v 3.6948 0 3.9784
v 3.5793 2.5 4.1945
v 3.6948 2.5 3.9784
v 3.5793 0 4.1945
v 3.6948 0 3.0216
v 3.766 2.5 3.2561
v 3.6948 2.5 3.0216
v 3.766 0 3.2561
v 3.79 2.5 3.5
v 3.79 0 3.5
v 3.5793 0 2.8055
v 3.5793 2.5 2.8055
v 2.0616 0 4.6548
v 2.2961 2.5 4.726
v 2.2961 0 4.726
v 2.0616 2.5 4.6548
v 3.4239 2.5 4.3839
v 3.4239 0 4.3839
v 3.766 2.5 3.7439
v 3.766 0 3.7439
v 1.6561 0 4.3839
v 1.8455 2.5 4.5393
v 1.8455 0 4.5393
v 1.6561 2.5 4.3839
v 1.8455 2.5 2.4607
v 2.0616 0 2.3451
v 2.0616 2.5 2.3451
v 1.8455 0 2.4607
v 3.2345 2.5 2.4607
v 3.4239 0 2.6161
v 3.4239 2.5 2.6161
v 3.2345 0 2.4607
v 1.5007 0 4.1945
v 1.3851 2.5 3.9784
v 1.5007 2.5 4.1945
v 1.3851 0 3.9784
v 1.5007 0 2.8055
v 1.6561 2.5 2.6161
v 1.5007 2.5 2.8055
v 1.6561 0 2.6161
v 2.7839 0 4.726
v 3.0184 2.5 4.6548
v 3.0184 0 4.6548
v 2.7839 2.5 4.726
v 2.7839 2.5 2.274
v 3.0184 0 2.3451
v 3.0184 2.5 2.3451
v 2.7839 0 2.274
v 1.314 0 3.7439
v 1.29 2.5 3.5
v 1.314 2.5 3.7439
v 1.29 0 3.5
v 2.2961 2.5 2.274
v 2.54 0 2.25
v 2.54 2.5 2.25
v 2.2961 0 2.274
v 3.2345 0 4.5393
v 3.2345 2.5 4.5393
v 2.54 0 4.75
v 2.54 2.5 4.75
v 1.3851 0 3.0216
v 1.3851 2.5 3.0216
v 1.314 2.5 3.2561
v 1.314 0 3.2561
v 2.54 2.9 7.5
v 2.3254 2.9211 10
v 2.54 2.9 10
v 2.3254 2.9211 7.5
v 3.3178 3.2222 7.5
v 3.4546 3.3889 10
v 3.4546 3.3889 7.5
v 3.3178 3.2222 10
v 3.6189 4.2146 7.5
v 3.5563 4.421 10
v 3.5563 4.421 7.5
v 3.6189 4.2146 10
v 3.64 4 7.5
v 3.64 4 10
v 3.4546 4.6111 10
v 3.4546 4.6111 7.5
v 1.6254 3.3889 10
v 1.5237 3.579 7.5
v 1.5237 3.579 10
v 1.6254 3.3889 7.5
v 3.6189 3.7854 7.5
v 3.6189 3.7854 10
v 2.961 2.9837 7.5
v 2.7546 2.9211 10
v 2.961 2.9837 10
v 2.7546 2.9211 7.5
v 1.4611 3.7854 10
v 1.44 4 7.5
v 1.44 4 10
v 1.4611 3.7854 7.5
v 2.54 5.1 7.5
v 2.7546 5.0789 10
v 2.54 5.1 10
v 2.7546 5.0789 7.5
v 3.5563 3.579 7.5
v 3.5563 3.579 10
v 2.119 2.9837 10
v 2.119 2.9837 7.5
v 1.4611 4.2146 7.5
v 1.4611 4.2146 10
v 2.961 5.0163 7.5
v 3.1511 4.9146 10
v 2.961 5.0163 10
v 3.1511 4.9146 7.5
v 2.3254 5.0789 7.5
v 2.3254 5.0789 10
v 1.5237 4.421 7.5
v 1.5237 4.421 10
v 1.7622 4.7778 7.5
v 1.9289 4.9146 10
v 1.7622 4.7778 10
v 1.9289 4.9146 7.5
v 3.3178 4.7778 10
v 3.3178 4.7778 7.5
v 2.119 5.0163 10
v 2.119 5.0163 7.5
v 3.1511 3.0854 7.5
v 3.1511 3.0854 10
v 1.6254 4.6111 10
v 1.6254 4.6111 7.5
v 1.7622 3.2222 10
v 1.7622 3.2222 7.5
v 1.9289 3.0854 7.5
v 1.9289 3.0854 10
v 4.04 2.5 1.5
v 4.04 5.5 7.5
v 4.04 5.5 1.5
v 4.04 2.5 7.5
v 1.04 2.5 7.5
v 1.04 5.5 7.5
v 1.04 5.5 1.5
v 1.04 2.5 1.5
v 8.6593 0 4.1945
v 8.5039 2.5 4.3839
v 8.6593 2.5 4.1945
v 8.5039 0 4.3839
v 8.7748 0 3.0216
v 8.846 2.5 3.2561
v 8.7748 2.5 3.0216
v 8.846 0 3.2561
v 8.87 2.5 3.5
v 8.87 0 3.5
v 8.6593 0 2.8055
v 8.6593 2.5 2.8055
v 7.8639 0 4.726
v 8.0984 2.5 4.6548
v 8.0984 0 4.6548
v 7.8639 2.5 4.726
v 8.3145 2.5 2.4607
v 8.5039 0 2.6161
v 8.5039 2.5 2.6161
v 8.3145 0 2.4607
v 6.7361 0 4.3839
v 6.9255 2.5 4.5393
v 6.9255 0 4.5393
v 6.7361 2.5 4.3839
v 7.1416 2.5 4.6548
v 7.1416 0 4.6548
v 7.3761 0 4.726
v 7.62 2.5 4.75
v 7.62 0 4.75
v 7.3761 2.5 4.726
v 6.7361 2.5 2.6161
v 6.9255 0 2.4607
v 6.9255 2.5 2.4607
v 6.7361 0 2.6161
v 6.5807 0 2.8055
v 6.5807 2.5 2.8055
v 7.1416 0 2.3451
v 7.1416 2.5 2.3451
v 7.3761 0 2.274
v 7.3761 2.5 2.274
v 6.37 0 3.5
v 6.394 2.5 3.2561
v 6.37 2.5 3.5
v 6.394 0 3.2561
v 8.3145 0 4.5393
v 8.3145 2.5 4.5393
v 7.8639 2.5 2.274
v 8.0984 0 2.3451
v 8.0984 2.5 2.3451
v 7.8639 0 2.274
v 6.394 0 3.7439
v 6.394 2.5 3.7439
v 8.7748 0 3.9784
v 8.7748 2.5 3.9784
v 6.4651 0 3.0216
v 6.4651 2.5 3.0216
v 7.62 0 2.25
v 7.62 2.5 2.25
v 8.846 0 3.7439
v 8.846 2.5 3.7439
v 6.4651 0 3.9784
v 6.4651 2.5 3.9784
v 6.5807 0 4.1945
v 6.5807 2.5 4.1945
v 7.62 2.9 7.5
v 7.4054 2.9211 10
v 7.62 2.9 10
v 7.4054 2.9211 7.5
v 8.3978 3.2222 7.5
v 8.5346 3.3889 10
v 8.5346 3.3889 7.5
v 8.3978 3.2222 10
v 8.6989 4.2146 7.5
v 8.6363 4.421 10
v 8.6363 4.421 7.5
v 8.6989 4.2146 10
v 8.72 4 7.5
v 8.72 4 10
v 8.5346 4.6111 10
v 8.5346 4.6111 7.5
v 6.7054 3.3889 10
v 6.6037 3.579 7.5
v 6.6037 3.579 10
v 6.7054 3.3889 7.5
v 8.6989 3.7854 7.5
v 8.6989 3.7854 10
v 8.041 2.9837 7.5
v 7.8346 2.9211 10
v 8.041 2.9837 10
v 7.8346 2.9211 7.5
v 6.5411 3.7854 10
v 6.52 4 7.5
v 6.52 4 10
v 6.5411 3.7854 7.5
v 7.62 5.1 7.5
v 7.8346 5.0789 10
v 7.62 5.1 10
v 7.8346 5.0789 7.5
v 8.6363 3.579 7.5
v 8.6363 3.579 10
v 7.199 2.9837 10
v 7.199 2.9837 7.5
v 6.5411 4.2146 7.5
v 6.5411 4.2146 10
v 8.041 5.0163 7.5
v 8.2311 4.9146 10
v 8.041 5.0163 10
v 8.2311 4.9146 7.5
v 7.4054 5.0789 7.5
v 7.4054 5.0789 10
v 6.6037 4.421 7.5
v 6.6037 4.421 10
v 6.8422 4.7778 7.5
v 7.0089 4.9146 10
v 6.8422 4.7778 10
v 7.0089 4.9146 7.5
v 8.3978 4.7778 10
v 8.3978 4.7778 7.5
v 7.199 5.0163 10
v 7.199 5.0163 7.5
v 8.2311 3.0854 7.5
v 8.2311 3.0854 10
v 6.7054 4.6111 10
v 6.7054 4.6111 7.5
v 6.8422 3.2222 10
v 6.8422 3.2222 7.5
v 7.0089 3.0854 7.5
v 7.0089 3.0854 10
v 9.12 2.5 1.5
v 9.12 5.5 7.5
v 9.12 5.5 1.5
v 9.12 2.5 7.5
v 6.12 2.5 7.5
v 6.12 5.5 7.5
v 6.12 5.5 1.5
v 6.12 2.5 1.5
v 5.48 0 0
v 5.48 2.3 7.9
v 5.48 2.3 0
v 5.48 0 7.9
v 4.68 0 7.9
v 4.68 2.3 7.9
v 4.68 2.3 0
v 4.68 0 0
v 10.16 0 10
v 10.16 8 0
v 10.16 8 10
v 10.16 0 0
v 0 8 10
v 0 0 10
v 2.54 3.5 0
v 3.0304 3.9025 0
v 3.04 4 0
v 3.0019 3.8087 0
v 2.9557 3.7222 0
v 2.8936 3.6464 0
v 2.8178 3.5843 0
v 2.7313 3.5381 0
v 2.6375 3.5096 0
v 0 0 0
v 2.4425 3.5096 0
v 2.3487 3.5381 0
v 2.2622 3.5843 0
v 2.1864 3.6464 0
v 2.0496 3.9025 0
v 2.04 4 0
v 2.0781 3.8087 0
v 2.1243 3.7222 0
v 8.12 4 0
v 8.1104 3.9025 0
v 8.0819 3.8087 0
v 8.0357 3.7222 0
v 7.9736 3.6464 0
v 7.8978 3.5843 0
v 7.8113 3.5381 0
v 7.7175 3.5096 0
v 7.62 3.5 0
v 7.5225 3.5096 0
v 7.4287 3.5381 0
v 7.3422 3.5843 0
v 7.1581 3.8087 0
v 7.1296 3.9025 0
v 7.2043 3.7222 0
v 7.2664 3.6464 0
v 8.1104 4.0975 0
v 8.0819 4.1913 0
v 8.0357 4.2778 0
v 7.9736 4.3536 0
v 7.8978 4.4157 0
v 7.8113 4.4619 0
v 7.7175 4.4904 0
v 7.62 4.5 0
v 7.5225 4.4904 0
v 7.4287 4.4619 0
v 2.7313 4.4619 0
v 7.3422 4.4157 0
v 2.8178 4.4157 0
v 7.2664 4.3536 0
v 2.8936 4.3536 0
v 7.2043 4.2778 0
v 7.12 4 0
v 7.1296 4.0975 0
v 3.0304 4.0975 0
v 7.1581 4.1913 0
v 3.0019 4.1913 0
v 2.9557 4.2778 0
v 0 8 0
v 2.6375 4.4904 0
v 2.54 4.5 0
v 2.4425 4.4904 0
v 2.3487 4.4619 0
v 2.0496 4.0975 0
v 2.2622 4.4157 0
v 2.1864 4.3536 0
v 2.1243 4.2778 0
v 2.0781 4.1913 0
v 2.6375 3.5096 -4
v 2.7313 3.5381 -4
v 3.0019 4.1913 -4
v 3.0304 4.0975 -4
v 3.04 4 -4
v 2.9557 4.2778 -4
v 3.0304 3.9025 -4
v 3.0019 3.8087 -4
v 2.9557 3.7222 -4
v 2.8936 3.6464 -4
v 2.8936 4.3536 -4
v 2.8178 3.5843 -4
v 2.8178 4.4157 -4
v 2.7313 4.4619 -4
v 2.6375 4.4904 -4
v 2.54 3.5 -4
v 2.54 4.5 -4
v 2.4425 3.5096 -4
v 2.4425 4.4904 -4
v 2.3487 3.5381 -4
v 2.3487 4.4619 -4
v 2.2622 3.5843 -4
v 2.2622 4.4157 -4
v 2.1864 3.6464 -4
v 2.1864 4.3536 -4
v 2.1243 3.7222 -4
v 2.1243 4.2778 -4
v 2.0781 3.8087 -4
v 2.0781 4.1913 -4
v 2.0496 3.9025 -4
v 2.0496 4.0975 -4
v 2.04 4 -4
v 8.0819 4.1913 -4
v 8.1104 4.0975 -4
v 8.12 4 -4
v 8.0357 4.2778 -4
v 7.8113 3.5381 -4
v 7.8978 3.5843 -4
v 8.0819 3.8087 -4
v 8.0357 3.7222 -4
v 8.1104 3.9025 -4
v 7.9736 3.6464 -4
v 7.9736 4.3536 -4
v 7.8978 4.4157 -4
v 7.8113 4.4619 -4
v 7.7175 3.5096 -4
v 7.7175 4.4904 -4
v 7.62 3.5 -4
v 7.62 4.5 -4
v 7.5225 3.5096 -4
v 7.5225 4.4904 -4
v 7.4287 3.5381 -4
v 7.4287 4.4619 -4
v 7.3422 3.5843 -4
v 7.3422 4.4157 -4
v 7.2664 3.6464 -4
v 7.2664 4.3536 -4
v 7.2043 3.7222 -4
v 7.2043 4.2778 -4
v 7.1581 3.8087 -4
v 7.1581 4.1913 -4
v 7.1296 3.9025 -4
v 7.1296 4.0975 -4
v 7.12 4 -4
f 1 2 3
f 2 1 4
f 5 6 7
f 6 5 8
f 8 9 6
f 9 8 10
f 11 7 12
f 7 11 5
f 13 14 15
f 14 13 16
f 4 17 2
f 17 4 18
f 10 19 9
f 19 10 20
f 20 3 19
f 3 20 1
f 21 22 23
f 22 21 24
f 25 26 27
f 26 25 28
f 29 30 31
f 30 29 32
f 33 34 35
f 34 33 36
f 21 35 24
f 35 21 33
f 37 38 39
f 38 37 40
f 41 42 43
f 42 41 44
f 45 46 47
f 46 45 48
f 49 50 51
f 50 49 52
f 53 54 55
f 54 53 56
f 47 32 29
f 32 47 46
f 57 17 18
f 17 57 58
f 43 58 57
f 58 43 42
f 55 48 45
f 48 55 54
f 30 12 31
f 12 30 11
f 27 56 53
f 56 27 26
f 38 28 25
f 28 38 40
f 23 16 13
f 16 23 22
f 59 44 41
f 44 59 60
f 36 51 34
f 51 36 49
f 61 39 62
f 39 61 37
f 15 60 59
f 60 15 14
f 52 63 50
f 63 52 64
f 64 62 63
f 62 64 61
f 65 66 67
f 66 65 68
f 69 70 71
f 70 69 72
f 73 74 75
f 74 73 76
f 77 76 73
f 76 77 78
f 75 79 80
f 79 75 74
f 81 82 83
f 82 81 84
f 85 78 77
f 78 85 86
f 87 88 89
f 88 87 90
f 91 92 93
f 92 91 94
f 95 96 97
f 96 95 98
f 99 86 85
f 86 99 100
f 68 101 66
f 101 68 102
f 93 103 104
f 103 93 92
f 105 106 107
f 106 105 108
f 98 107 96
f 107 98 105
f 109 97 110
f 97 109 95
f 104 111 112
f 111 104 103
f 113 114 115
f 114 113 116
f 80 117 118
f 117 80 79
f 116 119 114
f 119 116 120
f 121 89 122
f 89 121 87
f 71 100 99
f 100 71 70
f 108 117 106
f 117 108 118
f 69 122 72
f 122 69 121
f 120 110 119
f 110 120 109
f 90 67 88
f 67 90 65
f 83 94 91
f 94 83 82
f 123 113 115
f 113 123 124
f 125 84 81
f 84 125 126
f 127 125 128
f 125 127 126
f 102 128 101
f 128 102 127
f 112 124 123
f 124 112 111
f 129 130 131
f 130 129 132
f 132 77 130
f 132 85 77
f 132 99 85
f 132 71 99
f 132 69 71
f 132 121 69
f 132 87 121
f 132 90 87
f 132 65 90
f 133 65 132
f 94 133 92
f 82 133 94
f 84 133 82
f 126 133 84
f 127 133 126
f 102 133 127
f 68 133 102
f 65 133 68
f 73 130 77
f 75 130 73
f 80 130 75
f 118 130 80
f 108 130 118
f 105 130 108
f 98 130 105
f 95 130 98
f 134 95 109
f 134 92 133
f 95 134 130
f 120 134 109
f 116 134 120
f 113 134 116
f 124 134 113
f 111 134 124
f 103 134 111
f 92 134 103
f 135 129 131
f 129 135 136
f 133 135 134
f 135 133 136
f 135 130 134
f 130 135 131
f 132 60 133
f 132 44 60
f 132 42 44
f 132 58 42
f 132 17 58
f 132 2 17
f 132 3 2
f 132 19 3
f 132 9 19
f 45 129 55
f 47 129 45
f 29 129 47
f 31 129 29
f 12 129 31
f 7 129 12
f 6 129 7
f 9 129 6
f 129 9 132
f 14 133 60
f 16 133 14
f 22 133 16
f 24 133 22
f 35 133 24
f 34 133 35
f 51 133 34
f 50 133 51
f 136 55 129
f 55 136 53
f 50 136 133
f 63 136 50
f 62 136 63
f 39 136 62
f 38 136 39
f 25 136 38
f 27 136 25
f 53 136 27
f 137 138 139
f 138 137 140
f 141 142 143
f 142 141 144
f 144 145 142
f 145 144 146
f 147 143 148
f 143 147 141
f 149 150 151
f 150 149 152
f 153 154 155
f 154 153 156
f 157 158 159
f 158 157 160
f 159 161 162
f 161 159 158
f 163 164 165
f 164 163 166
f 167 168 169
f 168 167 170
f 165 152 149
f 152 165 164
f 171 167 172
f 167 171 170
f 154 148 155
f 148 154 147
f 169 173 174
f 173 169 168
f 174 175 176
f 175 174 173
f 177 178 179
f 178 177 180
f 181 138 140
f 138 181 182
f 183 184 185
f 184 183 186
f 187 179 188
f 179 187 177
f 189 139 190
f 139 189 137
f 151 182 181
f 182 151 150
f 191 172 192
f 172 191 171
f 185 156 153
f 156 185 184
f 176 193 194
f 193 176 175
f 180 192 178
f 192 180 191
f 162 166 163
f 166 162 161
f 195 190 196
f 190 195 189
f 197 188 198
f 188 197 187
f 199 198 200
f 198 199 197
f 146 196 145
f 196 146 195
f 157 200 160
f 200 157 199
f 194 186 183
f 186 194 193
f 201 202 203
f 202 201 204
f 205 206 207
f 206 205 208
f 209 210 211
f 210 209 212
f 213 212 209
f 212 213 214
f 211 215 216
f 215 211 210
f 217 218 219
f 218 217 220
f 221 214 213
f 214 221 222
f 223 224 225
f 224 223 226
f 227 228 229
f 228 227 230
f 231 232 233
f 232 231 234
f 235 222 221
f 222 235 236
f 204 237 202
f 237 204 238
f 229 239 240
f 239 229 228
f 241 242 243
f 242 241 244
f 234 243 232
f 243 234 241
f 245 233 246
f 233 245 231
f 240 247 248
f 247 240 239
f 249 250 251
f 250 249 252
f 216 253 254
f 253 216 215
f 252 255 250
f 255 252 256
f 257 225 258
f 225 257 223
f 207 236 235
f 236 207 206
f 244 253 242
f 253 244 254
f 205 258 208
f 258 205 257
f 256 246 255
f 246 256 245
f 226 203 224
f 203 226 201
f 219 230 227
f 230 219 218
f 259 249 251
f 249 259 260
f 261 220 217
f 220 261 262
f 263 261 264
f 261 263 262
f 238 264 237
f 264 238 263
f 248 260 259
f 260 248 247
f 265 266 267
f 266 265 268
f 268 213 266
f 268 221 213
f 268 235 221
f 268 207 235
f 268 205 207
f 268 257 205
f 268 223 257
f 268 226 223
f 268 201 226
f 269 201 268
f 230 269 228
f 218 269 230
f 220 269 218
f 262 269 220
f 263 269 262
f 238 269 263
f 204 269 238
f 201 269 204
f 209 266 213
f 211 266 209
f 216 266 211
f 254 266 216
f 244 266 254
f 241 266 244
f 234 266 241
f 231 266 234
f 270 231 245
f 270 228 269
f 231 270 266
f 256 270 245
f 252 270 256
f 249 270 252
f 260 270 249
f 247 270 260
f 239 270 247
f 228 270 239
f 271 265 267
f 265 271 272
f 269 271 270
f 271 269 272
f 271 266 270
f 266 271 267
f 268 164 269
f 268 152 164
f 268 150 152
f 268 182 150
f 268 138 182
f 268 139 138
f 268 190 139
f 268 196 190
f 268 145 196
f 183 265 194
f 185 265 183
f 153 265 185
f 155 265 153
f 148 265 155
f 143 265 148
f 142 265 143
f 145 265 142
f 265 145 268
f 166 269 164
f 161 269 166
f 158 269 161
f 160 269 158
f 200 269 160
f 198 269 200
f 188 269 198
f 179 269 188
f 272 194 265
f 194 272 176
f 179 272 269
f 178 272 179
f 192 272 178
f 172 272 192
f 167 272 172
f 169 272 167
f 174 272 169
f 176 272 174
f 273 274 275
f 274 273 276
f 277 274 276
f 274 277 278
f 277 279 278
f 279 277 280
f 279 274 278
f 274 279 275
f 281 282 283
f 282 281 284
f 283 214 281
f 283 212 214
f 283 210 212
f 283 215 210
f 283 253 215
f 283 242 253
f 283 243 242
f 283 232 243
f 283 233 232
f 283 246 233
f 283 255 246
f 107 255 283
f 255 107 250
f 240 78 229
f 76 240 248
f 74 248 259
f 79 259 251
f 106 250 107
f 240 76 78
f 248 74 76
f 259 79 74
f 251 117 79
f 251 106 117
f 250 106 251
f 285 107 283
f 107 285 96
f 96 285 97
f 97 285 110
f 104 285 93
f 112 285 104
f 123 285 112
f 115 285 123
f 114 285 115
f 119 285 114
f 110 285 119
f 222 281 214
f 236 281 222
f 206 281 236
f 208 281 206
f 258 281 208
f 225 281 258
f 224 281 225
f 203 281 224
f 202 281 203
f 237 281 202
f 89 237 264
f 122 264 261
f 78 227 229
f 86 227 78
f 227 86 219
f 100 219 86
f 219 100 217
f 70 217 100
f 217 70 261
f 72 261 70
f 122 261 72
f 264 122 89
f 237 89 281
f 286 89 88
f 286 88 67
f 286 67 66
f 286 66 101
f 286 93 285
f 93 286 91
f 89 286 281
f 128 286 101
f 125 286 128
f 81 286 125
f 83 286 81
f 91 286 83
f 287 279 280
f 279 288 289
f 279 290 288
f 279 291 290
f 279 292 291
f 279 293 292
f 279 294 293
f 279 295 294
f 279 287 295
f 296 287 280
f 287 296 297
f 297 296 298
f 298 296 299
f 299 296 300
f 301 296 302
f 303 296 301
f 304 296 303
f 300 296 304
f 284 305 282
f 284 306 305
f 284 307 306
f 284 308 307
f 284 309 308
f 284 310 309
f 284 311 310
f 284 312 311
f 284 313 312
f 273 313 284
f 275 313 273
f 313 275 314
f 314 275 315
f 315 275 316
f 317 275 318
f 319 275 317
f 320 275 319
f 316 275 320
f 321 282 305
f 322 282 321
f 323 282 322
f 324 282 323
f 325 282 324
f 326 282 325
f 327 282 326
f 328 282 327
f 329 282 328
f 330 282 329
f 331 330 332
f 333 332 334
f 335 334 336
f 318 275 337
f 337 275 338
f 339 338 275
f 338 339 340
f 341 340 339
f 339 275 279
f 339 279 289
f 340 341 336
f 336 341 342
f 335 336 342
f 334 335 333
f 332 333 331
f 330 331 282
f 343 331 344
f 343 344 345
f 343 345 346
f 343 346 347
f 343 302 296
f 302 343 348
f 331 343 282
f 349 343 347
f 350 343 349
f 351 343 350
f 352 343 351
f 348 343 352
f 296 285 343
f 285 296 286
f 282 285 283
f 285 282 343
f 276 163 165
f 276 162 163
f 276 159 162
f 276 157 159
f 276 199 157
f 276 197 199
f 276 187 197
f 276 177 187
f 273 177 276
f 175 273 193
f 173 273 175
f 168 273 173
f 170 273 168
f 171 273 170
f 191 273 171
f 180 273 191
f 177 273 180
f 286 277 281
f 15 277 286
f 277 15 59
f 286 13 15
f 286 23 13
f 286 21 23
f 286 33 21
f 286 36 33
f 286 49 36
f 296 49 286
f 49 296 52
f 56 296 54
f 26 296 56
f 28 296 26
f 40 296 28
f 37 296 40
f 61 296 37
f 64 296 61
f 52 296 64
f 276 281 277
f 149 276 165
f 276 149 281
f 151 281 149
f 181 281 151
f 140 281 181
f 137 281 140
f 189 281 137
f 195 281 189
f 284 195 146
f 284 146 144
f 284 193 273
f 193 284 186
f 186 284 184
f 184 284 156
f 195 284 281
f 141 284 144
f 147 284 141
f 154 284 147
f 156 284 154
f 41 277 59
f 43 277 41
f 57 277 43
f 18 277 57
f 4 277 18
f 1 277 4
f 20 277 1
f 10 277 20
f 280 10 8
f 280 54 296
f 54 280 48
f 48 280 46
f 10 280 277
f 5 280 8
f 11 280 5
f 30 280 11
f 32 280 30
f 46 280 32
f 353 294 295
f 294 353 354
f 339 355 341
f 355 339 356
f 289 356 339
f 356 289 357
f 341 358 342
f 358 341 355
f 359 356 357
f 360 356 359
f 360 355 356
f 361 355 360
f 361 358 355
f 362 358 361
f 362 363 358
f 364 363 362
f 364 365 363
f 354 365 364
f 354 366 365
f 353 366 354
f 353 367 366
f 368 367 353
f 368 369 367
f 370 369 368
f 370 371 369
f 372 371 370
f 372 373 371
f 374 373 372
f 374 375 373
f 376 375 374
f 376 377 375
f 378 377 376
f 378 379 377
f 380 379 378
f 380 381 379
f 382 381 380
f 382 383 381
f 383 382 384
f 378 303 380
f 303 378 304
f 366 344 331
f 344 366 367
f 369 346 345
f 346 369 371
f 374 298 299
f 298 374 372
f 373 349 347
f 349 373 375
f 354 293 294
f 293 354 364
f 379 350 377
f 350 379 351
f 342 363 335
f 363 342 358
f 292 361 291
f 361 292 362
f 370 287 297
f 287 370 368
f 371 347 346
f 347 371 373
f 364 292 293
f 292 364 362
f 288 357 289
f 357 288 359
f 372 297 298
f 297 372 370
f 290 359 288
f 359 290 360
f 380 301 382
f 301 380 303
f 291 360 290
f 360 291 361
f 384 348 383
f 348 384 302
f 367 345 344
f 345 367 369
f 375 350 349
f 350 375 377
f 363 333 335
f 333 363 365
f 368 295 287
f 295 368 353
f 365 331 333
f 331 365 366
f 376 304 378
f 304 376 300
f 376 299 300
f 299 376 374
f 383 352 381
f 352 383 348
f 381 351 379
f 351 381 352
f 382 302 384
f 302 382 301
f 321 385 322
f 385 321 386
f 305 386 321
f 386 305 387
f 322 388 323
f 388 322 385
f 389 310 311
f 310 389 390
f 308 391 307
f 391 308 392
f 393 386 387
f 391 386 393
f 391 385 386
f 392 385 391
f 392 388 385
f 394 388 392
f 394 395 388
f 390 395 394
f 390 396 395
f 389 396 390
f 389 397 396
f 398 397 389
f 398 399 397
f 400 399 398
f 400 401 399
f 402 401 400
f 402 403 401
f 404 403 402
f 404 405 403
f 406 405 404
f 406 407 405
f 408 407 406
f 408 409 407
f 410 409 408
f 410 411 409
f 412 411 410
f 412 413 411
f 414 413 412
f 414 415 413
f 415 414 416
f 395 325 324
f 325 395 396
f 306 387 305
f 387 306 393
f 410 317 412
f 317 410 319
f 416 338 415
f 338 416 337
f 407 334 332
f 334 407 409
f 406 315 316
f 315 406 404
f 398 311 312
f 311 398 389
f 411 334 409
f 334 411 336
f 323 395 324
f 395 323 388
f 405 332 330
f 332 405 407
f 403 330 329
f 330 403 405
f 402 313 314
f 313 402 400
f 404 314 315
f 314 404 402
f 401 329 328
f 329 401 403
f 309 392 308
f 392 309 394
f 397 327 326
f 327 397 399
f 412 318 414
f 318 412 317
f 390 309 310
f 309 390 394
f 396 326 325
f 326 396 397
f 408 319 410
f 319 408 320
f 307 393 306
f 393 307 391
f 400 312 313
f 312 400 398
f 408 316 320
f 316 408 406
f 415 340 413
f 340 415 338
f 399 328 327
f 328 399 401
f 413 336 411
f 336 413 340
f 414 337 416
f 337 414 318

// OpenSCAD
/* [Terminal Block Parameters] */
// Number of terminal positions/poles
poles = 2; // [2:1:24]
// Distance between center of pins (Pitch in mm)
pitch = 5.08; // [2.54, 3.5, 3.81, 5.00, 5.08, 7.5]
// Total height of the terminal plastic body
body_height = 10.0;
// Total depth of the terminal plastic body
body_depth = 8.0;

/* [Internal Hardware Elements] */
// Diameter of the entry hole for the wire
wire_hole_dia = 2.5;
// Diameter of the top screw entry hole
screw_hole_dia = 2.2;
// Depth of the terminal screw holes
screw_hole_depth = 4.0;
// Side-to-side wire entry window width (for internal cage)
cage_width = 3.0;

/* [PCB Pins] */
// Pin diameter
pin_dia = 1.0;
// Pin length below body
pin_length = 4.0;
// Pin position from the front/back edge
pin_y = body_depth / 2;

/* [Rendering Quality] */
// Smoothness of circles
$fn = 32;

// Execute the main model
terminal_block(poles, pitch, body_height, body_depth);

module terminal_block(p, pt, h, d) {
    body_width = p * pt;
    
    difference() {
        // 1. Main Outer Housing Block
        color("MediumSeaGreen")
        cube([body_width, d, h]);
        
        // Loop through each pole position to subtract internal details
        for (i = [0 : p - 1]) {
            // Calculate X-center for current pole
            x_pos = (i * pt) + (pt / 2);
            
            // 2. Wire Entry Holes (Front Face)
            // Positioned slightly above the bottom line
            translate([x_pos, -0.1, h * 0.35])
            rotate([-90, 0, 0])
            cylinder(d = wire_hole_dia, h = d * 0.6);
            
            // 3. Screw Holes (Top Face)
            // Positioned in the middle of the depth profile
            translate([x_pos, d / 2, h - screw_hole_depth + 0.1])
            cylinder(d = screw_hole_dia, h = screw_hole_depth);
            
            // 4. Clamping Cage Slots (Internal Rectangles)
            // Simulates the metal box that holds the wire
            translate([x_pos - (cage_width / 2), (d / 2) - 1.5, h * 0.15])
            cube([cage_width, 3.0, h * 0.6]);
            
            // 5. Interlocking Barrier/Divider slots
            if (i > 0) {
                translate([i * pt - 0.4, -0.1, -0.1])
                cube([0.8, d * 0.3, h * 0.8]);
            }
        }
    }

    // 6. PCB PINS UNDERNEATH
    // One pin per terminal position
    for (i = [0 : p - 1]) {
        x_pos = (i * pt) + (pt / 2);

        color("Silver")
        translate([x_pos, pin_y, -pin_length])
        cylinder(
            d = pin_dia,
            h = pin_length
        );
    }
}
